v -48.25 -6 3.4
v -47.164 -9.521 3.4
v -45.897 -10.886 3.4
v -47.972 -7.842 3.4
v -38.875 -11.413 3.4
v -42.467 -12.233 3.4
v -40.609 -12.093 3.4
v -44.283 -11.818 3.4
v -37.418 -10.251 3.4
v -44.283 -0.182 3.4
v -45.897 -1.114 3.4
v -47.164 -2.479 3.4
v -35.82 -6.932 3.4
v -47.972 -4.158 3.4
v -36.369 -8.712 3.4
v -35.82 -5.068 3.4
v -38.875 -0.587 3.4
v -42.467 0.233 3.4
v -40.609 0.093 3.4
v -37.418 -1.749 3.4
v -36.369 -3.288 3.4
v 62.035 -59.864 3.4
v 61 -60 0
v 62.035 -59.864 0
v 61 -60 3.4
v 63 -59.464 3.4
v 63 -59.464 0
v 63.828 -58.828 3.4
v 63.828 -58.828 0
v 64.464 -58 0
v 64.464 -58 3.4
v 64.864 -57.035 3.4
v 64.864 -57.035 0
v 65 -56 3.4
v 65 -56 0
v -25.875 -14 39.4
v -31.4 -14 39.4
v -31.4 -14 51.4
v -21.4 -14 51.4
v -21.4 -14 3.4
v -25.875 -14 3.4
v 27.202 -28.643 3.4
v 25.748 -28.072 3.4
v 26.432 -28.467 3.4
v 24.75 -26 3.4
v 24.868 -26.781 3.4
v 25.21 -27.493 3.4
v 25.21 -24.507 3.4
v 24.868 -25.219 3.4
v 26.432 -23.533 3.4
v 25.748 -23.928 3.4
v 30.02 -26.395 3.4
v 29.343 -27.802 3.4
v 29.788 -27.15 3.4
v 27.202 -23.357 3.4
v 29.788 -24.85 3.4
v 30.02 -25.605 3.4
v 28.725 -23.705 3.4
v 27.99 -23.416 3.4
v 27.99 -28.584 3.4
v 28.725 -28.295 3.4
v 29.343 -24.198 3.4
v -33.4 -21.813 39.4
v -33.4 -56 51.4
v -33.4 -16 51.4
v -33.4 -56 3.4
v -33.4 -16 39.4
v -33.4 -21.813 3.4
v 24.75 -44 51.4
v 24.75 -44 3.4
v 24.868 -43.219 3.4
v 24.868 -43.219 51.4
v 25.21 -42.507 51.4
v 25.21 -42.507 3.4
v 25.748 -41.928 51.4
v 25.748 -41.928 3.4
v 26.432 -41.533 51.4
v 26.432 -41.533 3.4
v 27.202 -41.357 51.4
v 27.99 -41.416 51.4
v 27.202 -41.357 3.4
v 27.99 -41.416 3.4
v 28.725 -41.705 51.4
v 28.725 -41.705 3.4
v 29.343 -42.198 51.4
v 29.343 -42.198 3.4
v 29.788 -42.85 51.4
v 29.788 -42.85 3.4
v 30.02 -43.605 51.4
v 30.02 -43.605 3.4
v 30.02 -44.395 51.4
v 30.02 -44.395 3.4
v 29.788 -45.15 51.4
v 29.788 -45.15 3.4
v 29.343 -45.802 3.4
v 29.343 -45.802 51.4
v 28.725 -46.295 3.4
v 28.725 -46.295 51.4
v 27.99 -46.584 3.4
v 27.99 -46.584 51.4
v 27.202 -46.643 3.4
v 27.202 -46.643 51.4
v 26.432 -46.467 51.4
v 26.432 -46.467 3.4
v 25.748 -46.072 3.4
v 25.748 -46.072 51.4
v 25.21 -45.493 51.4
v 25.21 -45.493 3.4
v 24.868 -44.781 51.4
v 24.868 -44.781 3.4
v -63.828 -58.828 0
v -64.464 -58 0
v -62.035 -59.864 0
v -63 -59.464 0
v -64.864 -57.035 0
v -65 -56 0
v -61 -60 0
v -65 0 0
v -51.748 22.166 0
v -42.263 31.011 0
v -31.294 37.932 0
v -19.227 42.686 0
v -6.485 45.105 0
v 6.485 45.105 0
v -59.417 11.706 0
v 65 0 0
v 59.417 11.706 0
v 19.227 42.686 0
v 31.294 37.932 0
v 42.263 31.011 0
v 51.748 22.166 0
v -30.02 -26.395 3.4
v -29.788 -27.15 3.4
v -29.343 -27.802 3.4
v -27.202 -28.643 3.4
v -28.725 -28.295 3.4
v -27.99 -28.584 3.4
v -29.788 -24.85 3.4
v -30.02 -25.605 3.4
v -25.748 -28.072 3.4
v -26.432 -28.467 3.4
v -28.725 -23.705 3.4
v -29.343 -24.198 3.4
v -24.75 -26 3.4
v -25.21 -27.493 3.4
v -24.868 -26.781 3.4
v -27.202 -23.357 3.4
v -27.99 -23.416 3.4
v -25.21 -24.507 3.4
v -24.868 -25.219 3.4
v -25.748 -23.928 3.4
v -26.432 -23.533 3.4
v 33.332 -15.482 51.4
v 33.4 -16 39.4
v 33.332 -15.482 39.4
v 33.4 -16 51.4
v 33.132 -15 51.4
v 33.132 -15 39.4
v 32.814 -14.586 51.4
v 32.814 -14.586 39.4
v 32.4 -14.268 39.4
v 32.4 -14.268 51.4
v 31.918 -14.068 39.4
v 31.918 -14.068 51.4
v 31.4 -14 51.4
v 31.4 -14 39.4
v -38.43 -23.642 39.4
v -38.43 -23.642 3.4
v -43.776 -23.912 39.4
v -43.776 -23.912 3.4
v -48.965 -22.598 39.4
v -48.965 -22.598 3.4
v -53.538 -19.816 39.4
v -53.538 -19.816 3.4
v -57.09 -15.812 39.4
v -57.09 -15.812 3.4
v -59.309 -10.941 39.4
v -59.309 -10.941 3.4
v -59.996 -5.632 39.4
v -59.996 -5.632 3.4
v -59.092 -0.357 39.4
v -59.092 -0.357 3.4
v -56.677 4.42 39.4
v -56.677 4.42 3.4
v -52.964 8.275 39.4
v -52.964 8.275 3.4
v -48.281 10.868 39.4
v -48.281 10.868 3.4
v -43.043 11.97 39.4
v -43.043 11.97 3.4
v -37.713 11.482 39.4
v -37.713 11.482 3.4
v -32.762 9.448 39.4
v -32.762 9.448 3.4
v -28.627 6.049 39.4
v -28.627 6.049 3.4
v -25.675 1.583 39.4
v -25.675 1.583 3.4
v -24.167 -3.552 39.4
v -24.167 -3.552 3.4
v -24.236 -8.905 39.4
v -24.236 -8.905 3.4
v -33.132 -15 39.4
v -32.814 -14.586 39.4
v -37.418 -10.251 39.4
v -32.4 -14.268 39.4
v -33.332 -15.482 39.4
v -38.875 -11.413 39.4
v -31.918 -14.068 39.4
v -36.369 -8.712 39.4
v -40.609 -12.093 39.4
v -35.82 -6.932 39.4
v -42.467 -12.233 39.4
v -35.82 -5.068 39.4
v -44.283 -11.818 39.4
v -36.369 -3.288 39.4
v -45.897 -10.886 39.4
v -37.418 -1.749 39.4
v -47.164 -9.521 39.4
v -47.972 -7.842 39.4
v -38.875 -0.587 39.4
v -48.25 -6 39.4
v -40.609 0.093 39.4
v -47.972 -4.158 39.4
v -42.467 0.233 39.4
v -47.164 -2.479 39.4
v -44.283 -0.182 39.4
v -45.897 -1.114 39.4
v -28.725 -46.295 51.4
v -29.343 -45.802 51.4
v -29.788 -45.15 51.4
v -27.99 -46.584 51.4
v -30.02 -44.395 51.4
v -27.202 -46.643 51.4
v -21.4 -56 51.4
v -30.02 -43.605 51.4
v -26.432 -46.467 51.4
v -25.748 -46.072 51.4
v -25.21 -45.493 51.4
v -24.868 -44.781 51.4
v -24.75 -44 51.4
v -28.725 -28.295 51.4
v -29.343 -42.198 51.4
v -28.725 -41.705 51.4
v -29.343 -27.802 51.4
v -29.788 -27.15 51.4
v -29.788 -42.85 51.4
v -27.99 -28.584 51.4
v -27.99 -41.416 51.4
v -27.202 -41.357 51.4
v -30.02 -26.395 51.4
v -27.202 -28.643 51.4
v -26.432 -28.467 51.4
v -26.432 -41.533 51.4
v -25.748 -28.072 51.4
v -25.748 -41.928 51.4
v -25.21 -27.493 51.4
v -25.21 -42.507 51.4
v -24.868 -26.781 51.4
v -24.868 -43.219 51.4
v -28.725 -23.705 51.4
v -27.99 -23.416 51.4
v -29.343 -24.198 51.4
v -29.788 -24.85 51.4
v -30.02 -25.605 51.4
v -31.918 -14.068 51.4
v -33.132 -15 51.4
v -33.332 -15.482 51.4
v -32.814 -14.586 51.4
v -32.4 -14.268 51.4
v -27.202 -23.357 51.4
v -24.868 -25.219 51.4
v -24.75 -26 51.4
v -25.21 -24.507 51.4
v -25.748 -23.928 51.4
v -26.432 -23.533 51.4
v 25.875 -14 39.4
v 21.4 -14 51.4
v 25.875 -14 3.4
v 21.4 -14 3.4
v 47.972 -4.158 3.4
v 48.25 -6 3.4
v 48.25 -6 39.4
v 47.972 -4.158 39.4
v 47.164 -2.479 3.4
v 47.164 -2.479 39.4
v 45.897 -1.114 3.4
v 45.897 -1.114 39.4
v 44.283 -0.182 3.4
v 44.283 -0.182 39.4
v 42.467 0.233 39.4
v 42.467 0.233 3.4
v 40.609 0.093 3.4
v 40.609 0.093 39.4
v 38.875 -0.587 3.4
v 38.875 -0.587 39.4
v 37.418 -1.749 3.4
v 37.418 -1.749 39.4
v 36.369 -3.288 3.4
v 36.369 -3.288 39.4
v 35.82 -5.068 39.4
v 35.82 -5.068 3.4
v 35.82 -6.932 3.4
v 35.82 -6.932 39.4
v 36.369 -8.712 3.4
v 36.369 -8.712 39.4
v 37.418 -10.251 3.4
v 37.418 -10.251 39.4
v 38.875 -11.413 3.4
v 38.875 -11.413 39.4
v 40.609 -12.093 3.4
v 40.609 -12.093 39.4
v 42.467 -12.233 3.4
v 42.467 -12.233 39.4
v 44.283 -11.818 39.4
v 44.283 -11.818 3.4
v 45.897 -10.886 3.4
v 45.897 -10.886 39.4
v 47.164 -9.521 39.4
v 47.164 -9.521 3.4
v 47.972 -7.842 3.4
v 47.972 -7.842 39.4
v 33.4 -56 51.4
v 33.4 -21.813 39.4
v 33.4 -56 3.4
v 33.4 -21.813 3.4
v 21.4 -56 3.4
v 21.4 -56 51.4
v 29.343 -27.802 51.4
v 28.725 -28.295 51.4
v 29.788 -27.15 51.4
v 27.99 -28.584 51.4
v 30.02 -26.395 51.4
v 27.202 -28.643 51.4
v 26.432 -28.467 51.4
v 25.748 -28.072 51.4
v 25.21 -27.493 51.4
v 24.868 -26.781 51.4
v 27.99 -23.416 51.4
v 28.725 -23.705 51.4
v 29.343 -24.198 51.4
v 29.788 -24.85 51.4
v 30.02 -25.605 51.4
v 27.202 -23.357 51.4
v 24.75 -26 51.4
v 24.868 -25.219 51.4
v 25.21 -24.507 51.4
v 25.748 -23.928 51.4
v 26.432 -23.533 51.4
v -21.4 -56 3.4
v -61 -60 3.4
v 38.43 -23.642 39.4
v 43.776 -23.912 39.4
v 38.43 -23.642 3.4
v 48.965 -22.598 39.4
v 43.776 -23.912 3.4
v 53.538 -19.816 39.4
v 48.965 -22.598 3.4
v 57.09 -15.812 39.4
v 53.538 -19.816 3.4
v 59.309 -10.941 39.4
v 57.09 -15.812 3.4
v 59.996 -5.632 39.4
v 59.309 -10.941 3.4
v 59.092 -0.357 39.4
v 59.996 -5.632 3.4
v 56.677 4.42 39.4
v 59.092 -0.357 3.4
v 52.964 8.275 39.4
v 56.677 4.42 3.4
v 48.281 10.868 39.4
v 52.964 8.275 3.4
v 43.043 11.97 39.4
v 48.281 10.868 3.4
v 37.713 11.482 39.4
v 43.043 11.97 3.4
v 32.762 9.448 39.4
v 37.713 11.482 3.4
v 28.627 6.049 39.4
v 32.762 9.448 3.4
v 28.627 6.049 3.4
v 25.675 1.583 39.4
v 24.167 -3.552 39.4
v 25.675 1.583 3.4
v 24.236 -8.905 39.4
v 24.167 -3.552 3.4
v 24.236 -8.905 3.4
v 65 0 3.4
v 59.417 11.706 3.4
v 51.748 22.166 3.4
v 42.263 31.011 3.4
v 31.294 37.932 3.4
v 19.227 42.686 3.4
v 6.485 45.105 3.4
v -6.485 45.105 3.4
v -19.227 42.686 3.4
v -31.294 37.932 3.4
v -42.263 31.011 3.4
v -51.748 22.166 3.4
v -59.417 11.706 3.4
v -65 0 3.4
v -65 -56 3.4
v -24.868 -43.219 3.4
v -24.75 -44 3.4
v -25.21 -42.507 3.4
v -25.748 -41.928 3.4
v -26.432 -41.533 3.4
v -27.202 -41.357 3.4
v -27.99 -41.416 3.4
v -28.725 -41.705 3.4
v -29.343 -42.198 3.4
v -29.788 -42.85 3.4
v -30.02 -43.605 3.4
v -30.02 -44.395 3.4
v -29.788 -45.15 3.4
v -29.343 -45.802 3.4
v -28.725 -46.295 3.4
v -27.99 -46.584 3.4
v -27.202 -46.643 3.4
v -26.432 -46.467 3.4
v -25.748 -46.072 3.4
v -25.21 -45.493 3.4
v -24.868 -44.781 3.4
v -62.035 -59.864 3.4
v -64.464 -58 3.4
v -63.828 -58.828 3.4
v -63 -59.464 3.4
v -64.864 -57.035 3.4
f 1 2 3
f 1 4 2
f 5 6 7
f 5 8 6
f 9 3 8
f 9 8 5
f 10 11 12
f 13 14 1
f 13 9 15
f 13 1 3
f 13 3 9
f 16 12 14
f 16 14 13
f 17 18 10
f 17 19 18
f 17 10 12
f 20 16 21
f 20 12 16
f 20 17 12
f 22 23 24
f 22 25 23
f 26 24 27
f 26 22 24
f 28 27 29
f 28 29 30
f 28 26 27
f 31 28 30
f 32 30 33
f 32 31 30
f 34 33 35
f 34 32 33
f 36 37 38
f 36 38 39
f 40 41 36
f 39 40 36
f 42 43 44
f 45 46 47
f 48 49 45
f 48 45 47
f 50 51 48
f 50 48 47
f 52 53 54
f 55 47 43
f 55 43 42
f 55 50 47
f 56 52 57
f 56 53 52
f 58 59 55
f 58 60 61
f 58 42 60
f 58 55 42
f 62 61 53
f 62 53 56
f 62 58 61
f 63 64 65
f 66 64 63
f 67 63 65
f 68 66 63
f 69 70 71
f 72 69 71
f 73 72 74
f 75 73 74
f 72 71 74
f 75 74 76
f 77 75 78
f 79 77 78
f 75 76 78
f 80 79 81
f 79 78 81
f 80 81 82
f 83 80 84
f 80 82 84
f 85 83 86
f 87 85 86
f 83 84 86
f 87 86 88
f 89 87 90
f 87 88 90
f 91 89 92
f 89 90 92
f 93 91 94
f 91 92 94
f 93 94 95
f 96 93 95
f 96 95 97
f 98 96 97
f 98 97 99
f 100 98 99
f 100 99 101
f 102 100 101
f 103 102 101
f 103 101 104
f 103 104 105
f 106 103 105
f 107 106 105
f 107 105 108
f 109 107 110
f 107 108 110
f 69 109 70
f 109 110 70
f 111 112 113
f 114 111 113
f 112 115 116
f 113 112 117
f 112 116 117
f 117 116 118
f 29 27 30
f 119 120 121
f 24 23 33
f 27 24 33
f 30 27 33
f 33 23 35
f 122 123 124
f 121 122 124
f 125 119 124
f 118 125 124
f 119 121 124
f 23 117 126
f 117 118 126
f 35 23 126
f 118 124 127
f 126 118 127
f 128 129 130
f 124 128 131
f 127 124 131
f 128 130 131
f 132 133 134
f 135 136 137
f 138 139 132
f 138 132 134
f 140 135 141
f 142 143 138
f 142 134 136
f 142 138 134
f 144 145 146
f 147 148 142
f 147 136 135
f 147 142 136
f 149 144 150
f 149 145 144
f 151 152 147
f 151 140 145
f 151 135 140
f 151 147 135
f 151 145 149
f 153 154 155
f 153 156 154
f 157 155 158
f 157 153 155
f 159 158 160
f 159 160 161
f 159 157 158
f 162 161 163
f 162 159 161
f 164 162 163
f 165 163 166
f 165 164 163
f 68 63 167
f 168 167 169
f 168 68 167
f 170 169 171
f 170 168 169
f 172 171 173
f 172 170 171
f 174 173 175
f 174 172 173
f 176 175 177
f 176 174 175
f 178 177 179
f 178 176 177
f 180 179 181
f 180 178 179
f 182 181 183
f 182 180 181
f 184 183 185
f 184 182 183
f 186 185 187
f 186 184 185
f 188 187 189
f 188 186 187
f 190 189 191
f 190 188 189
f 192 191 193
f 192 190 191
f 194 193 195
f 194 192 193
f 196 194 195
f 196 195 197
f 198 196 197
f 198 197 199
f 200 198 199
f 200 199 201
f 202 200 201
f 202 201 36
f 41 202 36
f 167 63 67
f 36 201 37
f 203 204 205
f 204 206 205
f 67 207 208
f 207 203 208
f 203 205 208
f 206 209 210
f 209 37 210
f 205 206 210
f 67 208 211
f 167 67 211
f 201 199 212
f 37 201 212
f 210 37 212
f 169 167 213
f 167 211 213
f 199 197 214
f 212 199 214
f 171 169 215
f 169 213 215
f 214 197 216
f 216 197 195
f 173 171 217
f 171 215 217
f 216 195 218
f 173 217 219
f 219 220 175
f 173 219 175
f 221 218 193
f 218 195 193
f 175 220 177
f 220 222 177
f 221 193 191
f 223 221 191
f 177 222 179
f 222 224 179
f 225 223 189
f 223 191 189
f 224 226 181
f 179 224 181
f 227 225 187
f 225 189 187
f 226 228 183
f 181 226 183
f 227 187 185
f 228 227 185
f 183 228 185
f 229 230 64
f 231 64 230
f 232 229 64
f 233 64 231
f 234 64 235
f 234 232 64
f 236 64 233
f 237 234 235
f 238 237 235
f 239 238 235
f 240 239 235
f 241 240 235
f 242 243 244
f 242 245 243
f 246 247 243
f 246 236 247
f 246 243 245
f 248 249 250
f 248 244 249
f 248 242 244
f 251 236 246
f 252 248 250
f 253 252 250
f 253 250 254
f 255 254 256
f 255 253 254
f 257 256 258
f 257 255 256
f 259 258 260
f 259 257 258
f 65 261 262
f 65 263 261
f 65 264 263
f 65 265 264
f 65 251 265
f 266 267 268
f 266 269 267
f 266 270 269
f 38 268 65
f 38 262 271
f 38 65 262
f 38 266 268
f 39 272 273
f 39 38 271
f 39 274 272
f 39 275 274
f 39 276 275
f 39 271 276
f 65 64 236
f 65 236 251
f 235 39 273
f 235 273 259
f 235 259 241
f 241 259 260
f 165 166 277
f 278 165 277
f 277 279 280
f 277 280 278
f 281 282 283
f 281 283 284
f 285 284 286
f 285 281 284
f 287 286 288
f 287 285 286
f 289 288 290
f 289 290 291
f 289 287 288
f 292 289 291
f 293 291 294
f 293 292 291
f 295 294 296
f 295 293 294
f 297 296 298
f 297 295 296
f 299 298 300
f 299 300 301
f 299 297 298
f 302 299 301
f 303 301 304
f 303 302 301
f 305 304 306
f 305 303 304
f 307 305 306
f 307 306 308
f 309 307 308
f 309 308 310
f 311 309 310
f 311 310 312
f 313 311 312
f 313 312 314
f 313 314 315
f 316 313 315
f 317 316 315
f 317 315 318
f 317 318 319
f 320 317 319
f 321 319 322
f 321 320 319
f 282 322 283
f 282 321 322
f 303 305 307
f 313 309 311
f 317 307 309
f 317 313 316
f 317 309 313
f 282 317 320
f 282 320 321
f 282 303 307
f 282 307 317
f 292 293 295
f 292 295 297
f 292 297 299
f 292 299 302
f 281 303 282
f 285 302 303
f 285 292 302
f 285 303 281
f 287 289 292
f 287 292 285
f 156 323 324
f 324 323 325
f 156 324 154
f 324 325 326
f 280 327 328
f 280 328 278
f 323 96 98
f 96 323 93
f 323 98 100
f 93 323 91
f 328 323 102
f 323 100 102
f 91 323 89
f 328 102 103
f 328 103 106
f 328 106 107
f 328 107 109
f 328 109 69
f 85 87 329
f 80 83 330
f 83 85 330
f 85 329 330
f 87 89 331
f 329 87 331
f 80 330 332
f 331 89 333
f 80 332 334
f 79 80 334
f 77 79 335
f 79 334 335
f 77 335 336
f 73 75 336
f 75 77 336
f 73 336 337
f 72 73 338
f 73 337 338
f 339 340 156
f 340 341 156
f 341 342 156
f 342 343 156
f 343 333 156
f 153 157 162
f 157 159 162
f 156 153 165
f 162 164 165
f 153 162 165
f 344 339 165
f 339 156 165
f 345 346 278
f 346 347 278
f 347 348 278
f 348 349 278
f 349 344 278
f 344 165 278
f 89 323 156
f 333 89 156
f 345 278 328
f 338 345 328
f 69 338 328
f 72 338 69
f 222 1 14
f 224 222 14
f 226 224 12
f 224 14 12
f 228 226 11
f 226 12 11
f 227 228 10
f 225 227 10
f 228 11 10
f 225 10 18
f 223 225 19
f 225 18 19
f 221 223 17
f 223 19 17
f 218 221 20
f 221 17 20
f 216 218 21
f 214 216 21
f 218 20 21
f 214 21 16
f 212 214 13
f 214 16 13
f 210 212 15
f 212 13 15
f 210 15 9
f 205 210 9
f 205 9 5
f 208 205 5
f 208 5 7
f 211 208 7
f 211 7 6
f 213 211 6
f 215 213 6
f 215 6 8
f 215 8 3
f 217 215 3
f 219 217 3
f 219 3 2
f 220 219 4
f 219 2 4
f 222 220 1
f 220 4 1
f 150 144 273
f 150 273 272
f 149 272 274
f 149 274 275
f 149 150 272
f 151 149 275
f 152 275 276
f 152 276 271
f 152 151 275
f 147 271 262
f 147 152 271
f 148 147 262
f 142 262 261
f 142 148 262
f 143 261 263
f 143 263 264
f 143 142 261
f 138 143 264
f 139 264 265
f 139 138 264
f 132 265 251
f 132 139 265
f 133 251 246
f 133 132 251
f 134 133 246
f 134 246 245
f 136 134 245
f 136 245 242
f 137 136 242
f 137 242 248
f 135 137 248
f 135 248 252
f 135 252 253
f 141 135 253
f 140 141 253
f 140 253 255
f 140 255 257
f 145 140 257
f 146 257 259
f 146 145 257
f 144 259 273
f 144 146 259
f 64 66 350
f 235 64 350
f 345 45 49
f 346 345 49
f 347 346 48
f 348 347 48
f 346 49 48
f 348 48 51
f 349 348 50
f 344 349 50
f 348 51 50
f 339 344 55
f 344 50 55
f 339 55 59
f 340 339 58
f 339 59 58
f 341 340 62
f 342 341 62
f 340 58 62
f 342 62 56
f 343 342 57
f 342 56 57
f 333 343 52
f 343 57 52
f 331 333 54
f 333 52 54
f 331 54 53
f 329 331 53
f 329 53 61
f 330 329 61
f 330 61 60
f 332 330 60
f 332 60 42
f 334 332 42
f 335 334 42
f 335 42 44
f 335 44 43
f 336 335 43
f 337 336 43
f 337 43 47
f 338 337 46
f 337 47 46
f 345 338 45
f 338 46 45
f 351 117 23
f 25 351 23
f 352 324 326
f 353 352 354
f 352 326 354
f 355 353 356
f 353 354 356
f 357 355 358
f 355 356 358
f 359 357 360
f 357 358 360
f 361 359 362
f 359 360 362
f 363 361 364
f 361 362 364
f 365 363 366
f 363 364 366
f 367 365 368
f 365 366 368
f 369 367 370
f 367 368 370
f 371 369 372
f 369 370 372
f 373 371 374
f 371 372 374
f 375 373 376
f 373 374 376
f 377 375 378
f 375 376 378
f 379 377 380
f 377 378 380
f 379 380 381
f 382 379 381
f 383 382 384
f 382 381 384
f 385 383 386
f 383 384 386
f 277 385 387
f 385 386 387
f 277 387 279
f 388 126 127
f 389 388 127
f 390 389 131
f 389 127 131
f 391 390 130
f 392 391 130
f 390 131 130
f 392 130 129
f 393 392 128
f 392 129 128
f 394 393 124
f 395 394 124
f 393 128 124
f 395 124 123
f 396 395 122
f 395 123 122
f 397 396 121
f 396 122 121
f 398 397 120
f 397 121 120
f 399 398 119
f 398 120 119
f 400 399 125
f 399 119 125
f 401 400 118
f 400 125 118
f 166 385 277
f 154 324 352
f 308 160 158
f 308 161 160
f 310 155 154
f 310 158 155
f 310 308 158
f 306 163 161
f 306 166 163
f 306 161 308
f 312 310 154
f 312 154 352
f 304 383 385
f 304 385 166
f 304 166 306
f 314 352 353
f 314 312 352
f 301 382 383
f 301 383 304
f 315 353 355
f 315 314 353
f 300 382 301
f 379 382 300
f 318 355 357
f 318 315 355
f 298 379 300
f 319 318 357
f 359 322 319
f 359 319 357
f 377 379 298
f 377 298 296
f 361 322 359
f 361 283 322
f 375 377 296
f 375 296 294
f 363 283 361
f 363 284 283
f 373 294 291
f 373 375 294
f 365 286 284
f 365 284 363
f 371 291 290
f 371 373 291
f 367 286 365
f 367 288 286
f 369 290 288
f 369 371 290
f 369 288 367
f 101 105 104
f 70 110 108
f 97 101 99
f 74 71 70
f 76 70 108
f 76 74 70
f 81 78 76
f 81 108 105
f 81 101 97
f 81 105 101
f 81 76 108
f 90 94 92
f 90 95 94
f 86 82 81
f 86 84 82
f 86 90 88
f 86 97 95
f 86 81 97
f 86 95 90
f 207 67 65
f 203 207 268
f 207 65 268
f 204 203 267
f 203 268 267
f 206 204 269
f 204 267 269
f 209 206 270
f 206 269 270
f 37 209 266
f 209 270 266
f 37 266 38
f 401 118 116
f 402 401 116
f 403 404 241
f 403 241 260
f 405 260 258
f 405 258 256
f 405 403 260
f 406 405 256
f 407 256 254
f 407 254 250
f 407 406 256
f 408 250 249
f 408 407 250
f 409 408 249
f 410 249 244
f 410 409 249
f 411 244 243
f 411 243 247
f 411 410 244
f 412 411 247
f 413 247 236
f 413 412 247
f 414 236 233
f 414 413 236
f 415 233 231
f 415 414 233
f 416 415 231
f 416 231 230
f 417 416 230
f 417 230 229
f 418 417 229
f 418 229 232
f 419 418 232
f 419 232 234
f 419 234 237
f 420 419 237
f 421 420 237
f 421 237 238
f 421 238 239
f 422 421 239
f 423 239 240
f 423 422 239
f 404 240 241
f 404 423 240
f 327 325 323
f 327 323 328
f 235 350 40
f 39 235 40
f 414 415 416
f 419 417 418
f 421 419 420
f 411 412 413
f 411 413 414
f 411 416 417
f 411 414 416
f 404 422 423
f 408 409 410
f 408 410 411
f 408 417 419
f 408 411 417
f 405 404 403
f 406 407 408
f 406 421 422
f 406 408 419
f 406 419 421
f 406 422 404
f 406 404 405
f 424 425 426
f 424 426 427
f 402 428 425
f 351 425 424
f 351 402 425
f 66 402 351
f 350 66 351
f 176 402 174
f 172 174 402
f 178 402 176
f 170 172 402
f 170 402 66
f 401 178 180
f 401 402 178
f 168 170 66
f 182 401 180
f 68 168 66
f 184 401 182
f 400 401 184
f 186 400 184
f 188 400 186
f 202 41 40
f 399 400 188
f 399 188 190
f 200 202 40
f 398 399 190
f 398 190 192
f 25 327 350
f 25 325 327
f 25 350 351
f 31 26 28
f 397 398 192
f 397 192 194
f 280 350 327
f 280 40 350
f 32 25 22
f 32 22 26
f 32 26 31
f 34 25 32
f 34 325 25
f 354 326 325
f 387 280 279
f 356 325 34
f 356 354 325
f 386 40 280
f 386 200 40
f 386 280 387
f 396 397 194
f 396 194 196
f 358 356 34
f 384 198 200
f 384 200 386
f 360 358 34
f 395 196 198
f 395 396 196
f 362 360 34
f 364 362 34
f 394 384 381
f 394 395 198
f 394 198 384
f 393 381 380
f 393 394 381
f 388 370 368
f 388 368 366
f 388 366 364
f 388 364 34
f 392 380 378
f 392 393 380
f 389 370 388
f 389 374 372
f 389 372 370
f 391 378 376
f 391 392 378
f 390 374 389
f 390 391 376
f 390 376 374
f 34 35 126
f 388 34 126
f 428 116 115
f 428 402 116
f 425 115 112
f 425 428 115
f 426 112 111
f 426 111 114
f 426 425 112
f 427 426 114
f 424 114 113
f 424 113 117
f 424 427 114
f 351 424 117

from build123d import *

# Parameters (mm, degrees)
PAD_DEPTH     = 3.4
FILLET_R      = 4
SKETCH001_R   = 18
SKETCH001_R_2 = 6.25
PAD001_DEPTH  = 36
SKETCH002_W   = 12
SKETCH002_H   = 42
SKETCH002_R   = 2.65
PAD002_DEPTH  = 48
FILLET002_R   = 2


with BuildPart() as part:
    # Sketch → Pad (new body)
    with BuildSketch(Plane.XY):
        with BuildLine():
            Line((-65, 0), (-65, -60))
            Line((-65, -60), (65, -60))
            Line((65, -60), (65, 0))
            ThreePointArc((65, 0), (0, 45.409517), (-65, 0))
        make_face()
    extrude(amount=PAD_DEPTH)

    # Fillet
    fillet_edges = [part.edges().sort_by_distance(p)[0] for p in [
        (65, -60, 1.7),
        (-65, -60, 1.7),
    ]]
    fillet(fillet_edges, radius=FILLET_R)

    # Sketch001 (on Face6 of Pad) → Pad001 (join)
    with BuildSketch(Plane.XY.offset(3.4)):
        with Locations((42, -6)):
            Circle(SKETCH001_R)
        with Locations((42, -6)):
            Circle(SKETCH001_R_2, mode=Mode.SUBTRACT)
    pad001 = extrude(amount=PAD001_DEPTH)

    # Mirrored: Pad001 across YZ
    add(pad001.mirror(Plane.YZ))

    # Sketch002 (on Face5 of Mirrored) → Pad002 (join)
    with BuildSketch(Plane.XY.offset(3.4)):
        with Locations((-27.4, -35)):
            Rectangle(SKETCH002_W, SKETCH002_H)
        with Locations((-27.4, -26)):
            Circle(SKETCH002_R, mode=Mode.SUBTRACT)
        with Locations((-27.4, -44)):
            Circle(SKETCH002_R, mode=Mode.SUBTRACT)
    pad002 = extrude(amount=PAD002_DEPTH)

    # Mirrored001: Pad002 across Sketch002 V_Axis
    add(pad002.mirror(Plane(origin=(0, 0, 3.4), x_dir=(0, 0, 1), z_dir=(1, 0, 0))))

    # Fillet002
    fillet002_edges = [part.edges().sort_by_distance(p)[0] for p in [
        (33.4, -14, 45.4),
        (-33.4, -14, 45.4),
    ]]
    fillet(fillet002_edges, radius=FILLET002_R)


solid = part.part
